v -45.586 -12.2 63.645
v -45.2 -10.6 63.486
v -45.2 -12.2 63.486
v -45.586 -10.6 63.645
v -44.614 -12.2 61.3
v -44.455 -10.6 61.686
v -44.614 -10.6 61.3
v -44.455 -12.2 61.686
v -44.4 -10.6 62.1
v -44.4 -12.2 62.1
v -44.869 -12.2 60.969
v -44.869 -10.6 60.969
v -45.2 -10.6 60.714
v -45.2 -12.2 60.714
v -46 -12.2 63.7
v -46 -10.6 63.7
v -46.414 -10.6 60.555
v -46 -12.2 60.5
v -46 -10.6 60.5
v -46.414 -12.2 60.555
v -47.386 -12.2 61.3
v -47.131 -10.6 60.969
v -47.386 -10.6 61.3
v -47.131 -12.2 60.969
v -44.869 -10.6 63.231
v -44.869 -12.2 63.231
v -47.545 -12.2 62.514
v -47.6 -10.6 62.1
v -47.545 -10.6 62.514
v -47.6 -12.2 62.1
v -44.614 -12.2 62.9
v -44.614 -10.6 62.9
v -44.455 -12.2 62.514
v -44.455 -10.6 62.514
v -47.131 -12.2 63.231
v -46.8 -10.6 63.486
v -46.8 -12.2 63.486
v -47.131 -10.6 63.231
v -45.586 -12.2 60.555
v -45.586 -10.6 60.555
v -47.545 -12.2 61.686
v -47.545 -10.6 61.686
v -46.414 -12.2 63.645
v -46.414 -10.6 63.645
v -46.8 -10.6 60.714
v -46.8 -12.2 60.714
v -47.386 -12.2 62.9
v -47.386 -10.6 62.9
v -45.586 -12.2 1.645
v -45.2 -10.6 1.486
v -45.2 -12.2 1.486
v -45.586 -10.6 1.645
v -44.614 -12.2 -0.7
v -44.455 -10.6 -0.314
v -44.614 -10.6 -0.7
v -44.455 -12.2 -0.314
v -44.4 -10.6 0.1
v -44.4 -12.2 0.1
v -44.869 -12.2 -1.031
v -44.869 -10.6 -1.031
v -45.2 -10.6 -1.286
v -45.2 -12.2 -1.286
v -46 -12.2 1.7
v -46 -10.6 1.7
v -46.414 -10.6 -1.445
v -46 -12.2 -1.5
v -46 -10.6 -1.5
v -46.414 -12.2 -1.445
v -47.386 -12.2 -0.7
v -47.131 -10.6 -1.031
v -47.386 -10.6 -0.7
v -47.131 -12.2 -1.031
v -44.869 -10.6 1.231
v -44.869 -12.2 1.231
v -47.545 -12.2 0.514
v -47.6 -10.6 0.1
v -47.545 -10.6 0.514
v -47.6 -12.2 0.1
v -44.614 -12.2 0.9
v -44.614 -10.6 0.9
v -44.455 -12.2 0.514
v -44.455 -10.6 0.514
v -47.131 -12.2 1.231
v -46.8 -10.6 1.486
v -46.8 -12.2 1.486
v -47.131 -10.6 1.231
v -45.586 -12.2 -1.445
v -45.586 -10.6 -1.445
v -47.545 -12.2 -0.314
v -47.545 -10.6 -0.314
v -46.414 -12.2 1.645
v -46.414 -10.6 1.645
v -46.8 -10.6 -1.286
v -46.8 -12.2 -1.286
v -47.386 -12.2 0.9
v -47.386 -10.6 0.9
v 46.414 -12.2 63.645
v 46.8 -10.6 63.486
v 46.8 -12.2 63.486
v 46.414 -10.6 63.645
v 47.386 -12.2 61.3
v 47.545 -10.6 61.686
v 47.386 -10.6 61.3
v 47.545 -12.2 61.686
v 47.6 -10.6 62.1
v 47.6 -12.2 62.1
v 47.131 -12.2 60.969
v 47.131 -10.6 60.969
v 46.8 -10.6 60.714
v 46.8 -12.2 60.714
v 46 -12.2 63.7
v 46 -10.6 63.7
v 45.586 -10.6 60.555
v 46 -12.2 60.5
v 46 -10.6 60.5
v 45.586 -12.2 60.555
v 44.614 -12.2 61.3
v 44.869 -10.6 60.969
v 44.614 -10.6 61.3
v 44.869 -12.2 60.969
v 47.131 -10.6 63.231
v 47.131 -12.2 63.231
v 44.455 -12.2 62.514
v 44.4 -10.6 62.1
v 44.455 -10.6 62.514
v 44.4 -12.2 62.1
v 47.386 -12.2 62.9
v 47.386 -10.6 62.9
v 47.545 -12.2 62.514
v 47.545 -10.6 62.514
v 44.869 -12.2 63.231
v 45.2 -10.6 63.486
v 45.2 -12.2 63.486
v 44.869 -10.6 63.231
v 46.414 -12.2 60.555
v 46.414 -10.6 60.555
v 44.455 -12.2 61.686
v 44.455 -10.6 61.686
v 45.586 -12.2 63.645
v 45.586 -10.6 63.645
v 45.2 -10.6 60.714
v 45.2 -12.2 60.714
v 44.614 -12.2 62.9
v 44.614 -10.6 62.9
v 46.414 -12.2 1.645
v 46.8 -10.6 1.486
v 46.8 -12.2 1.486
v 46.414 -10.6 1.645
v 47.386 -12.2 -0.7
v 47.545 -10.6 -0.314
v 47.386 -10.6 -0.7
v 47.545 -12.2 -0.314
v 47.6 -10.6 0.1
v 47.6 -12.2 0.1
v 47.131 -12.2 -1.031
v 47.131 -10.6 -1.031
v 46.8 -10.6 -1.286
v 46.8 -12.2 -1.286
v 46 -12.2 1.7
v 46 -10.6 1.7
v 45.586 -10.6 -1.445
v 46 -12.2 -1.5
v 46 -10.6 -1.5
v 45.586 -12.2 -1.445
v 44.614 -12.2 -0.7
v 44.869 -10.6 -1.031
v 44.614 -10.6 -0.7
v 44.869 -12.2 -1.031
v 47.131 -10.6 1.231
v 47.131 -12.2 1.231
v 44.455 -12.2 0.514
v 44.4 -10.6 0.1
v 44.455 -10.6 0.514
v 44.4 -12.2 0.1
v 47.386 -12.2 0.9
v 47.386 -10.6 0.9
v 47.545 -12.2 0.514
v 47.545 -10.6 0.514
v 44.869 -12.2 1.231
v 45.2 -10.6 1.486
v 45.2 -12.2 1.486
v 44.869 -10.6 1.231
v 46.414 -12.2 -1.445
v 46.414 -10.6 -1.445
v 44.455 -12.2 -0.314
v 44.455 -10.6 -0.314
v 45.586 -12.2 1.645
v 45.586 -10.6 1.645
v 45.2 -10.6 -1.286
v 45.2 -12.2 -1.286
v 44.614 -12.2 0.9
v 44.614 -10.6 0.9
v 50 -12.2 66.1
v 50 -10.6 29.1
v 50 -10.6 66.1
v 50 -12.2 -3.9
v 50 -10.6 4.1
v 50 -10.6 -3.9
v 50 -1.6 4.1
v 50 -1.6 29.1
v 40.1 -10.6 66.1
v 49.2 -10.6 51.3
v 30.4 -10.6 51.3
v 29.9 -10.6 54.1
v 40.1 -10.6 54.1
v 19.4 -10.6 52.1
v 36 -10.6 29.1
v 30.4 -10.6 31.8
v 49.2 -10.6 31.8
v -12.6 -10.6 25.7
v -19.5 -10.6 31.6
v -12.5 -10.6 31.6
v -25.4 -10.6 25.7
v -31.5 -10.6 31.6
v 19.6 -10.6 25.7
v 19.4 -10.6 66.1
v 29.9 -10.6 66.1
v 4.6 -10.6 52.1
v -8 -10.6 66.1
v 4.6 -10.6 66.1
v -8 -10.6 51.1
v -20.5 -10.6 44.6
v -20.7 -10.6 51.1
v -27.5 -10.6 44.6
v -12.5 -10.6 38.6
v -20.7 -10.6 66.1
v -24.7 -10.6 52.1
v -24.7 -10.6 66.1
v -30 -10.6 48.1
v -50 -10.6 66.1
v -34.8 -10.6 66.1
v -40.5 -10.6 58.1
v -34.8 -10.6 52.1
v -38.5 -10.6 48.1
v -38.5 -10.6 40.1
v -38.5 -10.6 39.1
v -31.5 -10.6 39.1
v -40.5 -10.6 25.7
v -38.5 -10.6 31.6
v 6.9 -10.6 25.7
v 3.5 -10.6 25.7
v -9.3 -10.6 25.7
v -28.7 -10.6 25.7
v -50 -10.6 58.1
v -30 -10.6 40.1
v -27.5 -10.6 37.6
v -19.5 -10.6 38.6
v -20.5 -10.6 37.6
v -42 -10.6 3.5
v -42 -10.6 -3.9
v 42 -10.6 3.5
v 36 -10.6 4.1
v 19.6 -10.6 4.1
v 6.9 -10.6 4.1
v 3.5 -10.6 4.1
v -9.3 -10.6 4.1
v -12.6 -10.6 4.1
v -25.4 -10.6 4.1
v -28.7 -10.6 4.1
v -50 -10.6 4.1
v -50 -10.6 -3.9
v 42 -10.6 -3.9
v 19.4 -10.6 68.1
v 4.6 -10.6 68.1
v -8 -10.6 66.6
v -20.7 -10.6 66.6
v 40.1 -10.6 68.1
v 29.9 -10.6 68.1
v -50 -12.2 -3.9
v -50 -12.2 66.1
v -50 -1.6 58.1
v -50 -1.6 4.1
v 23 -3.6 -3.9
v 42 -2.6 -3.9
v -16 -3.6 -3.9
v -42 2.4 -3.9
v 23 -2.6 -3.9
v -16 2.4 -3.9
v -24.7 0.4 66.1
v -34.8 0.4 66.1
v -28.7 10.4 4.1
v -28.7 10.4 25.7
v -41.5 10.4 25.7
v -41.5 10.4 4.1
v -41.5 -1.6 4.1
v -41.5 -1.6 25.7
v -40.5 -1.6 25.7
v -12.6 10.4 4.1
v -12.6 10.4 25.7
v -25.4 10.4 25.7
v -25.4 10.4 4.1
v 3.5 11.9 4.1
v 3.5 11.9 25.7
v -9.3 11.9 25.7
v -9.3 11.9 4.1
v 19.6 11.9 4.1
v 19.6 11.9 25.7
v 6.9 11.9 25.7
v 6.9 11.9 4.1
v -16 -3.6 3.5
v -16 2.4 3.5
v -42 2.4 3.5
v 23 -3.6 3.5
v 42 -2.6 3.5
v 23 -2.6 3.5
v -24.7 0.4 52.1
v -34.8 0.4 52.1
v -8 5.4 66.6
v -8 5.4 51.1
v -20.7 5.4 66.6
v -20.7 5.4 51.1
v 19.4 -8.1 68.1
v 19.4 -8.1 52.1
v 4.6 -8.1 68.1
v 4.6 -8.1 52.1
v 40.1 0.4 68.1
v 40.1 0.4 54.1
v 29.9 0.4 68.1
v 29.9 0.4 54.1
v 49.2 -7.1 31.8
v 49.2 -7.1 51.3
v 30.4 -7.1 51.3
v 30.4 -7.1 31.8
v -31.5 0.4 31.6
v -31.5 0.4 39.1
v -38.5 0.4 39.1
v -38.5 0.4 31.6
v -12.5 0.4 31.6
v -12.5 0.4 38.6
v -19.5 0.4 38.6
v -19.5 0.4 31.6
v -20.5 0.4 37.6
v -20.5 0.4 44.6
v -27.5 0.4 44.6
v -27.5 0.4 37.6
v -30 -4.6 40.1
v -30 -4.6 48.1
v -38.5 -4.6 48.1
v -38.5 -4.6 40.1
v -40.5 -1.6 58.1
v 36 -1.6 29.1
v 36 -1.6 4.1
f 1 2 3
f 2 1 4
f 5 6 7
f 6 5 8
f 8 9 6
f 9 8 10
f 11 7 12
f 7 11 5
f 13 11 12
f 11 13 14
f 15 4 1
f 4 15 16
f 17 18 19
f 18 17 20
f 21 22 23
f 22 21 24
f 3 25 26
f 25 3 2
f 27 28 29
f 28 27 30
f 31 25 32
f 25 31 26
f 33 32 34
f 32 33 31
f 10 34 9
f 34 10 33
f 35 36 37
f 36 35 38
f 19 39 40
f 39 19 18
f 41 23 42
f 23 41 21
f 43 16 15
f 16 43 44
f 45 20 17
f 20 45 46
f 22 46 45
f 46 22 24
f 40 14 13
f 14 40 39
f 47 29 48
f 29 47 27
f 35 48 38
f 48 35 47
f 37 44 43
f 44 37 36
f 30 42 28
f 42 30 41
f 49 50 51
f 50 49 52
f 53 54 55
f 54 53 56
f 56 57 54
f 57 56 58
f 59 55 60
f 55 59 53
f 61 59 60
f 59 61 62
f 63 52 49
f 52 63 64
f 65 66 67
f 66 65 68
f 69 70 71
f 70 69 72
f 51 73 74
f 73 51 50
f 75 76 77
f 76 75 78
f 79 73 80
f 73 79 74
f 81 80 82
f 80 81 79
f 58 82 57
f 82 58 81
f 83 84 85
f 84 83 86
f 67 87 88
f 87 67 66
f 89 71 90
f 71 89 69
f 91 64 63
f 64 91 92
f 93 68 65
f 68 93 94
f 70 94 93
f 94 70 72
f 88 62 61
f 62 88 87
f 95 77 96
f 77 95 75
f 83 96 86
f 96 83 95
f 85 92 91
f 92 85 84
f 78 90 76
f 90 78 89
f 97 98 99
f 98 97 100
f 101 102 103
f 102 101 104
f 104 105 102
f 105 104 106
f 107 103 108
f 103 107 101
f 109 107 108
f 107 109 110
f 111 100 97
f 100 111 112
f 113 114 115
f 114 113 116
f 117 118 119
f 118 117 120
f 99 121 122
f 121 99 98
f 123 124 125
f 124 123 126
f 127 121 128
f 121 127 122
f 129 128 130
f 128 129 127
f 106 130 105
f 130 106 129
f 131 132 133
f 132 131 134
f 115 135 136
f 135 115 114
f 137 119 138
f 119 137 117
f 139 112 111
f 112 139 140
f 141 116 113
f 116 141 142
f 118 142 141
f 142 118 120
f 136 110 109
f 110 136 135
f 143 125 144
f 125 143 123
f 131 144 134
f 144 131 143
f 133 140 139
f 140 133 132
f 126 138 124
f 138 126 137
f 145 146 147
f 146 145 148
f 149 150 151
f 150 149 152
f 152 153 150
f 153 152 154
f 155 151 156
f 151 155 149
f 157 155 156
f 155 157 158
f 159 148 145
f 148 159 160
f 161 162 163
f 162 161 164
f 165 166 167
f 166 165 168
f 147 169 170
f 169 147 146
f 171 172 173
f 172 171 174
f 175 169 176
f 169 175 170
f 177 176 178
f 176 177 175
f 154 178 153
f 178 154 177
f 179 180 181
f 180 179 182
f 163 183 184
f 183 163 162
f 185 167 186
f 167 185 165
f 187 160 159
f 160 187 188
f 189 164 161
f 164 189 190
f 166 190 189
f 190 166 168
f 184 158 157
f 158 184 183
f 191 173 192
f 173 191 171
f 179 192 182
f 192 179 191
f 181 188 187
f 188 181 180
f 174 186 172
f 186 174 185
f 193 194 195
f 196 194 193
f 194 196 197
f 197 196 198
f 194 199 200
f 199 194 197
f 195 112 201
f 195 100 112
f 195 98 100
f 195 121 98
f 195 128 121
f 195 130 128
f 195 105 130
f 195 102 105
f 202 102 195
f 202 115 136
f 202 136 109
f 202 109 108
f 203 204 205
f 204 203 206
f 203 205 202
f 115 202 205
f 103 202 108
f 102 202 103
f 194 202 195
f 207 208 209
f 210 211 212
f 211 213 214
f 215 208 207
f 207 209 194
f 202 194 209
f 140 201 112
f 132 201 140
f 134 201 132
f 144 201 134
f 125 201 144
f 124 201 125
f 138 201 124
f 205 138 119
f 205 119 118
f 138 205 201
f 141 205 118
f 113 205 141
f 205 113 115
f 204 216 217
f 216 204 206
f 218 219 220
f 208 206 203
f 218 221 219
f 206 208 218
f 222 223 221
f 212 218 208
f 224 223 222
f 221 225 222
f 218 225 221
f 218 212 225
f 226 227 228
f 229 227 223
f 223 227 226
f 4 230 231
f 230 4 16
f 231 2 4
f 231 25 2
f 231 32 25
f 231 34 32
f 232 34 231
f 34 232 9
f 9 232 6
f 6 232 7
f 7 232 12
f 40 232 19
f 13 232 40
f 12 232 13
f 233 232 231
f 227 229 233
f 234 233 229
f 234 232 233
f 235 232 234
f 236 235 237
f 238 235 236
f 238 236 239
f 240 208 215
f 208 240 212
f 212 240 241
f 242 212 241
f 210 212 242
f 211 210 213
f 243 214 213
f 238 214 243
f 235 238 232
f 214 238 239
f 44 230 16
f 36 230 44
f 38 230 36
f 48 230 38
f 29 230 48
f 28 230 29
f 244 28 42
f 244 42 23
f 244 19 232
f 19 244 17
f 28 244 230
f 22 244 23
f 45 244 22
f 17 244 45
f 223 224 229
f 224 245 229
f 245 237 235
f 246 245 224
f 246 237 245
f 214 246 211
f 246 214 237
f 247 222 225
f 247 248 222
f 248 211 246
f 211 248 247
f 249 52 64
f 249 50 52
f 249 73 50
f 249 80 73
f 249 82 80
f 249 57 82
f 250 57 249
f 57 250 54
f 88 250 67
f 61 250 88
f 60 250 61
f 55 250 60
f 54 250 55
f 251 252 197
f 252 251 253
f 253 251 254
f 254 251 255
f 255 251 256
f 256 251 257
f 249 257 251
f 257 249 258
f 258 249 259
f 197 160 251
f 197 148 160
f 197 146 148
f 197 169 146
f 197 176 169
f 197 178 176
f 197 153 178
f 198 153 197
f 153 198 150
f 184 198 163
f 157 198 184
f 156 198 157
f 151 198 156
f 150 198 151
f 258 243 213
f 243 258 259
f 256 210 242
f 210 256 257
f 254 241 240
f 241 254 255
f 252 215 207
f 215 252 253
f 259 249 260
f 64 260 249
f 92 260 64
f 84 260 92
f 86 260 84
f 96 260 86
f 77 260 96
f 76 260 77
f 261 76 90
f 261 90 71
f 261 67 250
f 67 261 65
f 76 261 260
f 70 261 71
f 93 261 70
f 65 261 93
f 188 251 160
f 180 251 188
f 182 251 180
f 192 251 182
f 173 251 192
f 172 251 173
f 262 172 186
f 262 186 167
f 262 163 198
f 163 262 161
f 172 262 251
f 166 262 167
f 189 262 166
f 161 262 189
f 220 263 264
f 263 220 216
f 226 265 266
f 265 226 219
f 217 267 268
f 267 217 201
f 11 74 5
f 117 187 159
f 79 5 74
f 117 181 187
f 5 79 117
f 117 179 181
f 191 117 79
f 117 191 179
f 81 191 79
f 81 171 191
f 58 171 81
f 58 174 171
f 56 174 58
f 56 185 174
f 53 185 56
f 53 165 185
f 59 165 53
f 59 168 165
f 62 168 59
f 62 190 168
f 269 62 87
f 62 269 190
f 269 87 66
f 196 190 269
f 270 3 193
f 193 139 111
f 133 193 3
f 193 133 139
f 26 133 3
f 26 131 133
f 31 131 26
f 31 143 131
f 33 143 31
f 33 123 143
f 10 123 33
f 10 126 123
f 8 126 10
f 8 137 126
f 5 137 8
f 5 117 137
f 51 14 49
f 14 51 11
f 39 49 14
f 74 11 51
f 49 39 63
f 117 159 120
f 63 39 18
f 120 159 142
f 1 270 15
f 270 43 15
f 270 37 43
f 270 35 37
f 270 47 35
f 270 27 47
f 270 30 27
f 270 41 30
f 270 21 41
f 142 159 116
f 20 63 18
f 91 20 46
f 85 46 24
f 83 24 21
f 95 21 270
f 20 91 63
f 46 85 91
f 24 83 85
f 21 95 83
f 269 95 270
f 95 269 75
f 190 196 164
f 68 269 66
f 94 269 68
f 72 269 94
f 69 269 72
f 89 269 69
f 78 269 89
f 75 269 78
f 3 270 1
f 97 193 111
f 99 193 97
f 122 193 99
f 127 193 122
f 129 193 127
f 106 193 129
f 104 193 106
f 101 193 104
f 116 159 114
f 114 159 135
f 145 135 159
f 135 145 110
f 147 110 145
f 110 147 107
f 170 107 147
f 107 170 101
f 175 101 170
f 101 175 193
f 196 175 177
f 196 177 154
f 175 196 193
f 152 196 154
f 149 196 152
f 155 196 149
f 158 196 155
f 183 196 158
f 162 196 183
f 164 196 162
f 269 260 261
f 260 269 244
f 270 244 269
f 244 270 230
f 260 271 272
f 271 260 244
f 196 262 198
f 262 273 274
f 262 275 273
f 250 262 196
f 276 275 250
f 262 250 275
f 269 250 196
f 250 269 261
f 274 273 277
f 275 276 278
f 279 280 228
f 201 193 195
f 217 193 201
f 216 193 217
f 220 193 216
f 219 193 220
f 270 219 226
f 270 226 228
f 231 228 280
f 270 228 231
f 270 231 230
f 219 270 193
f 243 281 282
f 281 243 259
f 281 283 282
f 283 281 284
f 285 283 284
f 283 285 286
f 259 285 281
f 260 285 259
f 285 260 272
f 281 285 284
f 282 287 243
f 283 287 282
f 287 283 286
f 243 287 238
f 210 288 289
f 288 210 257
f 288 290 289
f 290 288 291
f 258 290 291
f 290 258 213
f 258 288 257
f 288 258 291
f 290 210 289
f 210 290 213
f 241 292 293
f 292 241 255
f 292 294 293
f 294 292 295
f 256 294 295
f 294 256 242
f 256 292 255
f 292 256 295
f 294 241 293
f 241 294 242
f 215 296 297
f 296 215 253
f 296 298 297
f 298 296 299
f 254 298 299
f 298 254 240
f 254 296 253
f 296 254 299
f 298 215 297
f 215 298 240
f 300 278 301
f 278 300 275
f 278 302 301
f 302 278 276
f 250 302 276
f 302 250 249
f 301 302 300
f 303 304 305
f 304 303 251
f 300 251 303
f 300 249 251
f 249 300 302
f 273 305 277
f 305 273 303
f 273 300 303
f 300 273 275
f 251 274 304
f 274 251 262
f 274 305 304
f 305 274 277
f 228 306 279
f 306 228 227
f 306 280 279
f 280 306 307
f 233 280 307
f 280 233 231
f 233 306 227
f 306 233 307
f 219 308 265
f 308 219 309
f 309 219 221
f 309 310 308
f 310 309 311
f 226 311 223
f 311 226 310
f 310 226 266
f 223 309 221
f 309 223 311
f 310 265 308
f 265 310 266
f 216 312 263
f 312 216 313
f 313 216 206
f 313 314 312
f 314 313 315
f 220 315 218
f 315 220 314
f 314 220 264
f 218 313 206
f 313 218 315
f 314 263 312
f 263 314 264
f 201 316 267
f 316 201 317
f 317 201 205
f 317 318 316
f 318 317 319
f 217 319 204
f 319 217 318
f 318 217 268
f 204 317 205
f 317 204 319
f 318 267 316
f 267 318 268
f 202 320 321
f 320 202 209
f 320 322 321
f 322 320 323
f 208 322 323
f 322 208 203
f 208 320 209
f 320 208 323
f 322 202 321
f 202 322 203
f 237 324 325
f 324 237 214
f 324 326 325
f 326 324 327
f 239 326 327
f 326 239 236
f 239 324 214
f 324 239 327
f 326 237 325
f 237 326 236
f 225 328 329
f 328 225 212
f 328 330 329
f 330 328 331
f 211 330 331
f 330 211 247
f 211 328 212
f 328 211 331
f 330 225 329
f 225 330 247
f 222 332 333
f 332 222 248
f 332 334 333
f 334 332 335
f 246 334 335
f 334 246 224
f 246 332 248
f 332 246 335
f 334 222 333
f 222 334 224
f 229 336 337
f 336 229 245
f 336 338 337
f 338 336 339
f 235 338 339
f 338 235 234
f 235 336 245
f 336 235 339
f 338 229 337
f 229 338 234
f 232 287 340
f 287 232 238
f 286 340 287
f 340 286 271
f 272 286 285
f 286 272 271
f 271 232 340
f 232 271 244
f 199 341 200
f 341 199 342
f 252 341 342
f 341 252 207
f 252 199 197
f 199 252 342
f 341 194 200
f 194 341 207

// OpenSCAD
// file: params.scad
// Shared numbers for the DLC32 MAX remix.
// Frame: the stock bottom.stl frame (mm). x = across the bot, z = up the wall,
// y = out from the wall (back plate at y = -18.1, plate top surface at y = -15.2).
// The stock cover sits at translate(COVER_FRAME) in this frame (taken from Mural v2.step).

COVER_FRAME = [0, 1.5, 16.8];

PLATE_BACK = -18.1;
PLATE_TOP  = -15.2;

// Cover remix
STRETCH_X_AT = 30;   // cut planes at x = +/-30 (no features there)
STRETCH_X    = 8;    // added per side: inner width 88 -> 104
STRETCH_Z_AT = 26.8; // cut plane between the OLED holder and the PD-trigger pocket
STRETCH_Z    = 6;    // moves the upper screw posts clear of the board
RAISE_LID    = 8;    // extra depth over the middle of the lid
RAISE_HALF_W = 46;   // raised band is |x| < 46: keeps clear of the belts (they leave the pulleys at |x| ~ 50)
LID_IN  = 15.2;      // stock lid underside
LID_OUT = 18.15;     // stock lid top

STRETCH_SPLIT_Z = -5.5; // only the cover above this is stretched in x; the lower corners
                        // (feet, lower posts) stay stock so they keep fitting the tray

// Cover screw posts [x, z] after the stretch (stock: x +/-40.4, z -10.1 / 66.3)
POSTS = [[40.4, -10.1], [40.4 + STRETCH_X, 66.3 + STRETCH_Z]];
POST_Z = [POSTS[0][1], POSTS[1][1]];

// Board placement: landscape, motor-connector edge facing down (toward the motors),
// USB / SD / DC-jack edge facing the top wall of the cover.
BOARD_W = 100;
BOARD_H = 70;
BOARD_HOLE_DX = 92;
BOARD_HOLE_DZ = 62;
BOARD_ZC = (POST_Z[0] + POST_Z[1]) / 2;   // centered between the screw posts
STANDOFF = 3;                              // board boss height above the plate
PCB_T = 1.6;
PCB_BOTTOM = PLATE_TOP + STANDOFF;

// Plate outline after the remix (cover walls sit on it)
PLATE_HALF_W = 47 + STRETCH_X;
PLATE_TOP_Z  = 72.9 + STRETCH_Z;

// Heat-set inserts (M3x4x5, same as stock)
INSERT_D = 4.2;
// main file
// MKS DLC32 MAX keep-out model, for fit checks only (not printed).
// Positions from "MKS DLC32 MAX Manual.pdf" (Installation Dimensions) and the V1.0_002 PIN.pdf.
// Board-local frame: x_d right, y_d up as in the MKS drawing (component side up), origin at the
// bottom-left corner, z = height above the top of the PCB. Component heights are estimates:
// measure your board (driver + heatsink especially) and adjust DRIVER_H if needed.

include <params.scad>

DRIVER_H = 21;   // socket (8.5) + StepStick PCB (1.6) + heatsink (~10) + margin

// [x0, y0, x1, y1, height, name]
PARTS = [
    // TMC2209 modules in the X and Y sockets (Z and A sockets stay empty)
    [ 8.5, 40.4, 21.3, 62.0, DRIVER_H, "X driver"],
    [24.6, 40.4, 37.4, 62.0, DRIVER_H, "Y driver"],
    // Empty Z / A sockets with dupont plugs for the OLED and servo
    [40.7, 40.4, 53.5, 62.0, 8.5 + 14, "Z socket + dupont"],
    [56.9, 40.4, 69.6, 62.0, 8.5 + 14, "A socket + dupont"],
    // Motor connectors along the top edge (XH 2.54), plugs in X and Y1
    [ 8.0, 62.6, 34.0, 70.0, 7 + 6, "X/Y1 motor plugs"],
    [34.0, 62.6, 73.0, 70.0, 7, "Y2/Z/A motor headers"],
    [73.0, 62.6, 92.0, 70.0, 8, "AIR/BEEPER"],
    // Bottom edge: DC jack, RJ11, SD, USB (SD and USB stick out ~2 mm)
    [15.2,  0.0, 25.3, 14.0, 11, "DC jack"],
    [29.3, -0.5, 42.0, 15.0, 16, "RJ11 display"],
    [54.6, -2.0, 69.4, 14.0, 2.5, "SD slot"],
    [79.9, -2.0, 90.1, 12.0, 11, "USB (J19)"],
    // Big parts in the middle
    [80.4, 14.8, 99.2, 34.3, 3.5, "ESP32-S3 module"],
    [11.5, 27.0, 18.5, 34.5, 11, "C5"],
    [30.5, 27.5, 37.5, 34.5, 11, "C13"],
    [22.5, 21.5, 29.5, 28.5, 11, "C21"],
    [11.5, 18.0, 20.0, 26.0, 6, "regulator / inductor"],
    // Left edge terminals, right edge endstop / aux headers
    [ 0.0,  8.0,  9.5, 62.0, 9, "left terminals"],
    [86.0, 37.0, 100.0, 62.0, 9, "endstop headers"],
];

module board_local(show_parts = true) {
    color("green") difference() {
        translate([0, 0, -PCB_T]) cube([BOARD_W, BOARD_H, PCB_T]);
        for (x = [4, 96], y = [4, 66]) translate([x, y, -5]) cylinder(d = 3.2, h = 10, $fn = 24);
    }
    if (show_parts)
        for (p = PARTS) color("dimgray") translate([p[0], p[1], 0]) cube([p[2] - p[0], p[3] - p[1], p[4]]);
}

// Board-local -> bot frame. Rotated 180 degrees in the wall plane: the motor-connector edge
// (drawing top) faces down toward the motors, the USB/SD/DC edge faces the cover's top wall.
module place_board() {
    multmatrix([[1, 0, 0, -BOARD_W / 2],
                [0, 0, 1, PCB_BOTTOM + PCB_T],
                [0, -1, 0, BOARD_ZC + BOARD_H / 2],
                [0, 0, 0, 1]]) children();
}

module dlc32max_placed(show_parts = true) place_board() board_local(show_parts);

dlc32max_placed();
